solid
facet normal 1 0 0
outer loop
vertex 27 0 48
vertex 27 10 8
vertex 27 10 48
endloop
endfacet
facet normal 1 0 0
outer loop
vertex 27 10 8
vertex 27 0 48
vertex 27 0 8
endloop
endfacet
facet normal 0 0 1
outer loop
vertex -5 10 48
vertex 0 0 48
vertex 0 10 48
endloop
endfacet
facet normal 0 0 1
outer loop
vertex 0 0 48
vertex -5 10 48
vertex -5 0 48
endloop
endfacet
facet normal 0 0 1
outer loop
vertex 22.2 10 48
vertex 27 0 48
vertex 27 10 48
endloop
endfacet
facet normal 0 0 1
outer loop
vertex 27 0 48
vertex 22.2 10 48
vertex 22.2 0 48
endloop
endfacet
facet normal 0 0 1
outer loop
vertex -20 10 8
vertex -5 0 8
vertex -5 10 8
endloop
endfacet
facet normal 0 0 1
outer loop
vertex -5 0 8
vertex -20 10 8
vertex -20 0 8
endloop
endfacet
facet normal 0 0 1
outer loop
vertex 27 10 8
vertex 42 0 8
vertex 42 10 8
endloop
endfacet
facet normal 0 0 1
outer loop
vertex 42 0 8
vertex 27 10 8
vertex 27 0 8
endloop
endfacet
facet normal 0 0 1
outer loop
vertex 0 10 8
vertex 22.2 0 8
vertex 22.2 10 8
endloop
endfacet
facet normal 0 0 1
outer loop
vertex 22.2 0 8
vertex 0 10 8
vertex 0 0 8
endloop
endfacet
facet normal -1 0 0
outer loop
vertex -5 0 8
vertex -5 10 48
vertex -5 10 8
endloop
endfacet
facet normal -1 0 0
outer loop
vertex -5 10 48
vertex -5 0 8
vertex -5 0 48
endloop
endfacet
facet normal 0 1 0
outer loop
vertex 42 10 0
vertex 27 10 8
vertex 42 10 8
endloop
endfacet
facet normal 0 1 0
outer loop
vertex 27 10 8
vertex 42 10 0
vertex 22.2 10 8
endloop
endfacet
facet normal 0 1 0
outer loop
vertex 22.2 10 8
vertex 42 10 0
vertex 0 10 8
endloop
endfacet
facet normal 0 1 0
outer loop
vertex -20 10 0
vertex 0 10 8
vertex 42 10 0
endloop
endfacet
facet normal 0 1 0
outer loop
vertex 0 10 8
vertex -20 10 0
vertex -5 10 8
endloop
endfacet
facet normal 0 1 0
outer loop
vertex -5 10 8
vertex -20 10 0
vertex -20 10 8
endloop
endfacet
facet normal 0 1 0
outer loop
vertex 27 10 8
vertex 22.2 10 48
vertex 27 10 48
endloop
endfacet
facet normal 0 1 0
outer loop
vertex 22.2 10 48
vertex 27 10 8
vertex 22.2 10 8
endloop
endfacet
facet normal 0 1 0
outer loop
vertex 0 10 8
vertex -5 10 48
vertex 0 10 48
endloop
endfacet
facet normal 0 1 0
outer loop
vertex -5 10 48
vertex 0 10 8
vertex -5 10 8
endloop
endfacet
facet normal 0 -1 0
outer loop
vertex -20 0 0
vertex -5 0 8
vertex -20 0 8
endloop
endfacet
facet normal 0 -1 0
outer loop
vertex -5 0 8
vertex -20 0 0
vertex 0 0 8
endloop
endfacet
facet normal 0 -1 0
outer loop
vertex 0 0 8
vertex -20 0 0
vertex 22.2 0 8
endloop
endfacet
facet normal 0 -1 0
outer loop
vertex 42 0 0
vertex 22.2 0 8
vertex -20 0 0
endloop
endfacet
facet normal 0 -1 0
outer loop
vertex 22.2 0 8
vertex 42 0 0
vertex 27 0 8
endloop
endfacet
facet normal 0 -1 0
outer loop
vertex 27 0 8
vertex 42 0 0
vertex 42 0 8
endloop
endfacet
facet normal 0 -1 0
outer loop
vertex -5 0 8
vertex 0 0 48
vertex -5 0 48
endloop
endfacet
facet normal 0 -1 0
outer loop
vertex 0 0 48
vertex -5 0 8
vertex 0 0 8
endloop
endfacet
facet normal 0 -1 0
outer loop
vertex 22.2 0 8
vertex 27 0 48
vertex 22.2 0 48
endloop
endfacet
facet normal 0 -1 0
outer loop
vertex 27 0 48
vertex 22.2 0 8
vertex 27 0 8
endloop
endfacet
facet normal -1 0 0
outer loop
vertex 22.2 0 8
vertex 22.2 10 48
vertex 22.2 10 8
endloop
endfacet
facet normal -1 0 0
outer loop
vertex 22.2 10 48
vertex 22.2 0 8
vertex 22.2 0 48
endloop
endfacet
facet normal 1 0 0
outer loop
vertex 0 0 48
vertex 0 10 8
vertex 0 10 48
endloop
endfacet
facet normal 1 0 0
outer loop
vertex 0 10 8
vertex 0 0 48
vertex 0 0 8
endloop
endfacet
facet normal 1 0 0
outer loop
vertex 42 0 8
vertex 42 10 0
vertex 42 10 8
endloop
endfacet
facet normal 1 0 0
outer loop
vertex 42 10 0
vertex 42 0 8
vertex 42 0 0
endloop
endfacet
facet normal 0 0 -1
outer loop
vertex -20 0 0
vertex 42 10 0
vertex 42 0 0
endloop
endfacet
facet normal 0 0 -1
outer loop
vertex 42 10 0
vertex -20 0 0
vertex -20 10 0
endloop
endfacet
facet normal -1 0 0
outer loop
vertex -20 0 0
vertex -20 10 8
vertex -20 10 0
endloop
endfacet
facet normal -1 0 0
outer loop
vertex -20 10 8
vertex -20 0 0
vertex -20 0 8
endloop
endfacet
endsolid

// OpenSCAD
lightThickness = 22;
lightDepth = 10;
lightHeight = 40;
lightAllowance = 0.2;

lightHolderWallThickness = 5;
elevationHeight = 8;
totalHeight = elevationHeight + lightHeight;
footProtrusion = 15;

footWidth = lightThickness + (footProtrusion * 2);

holderWidth = lightThickness + (lightHolderWallThickness * 2);

module holderBody() {
    translate([-lightHolderWallThickness, 0, 0]) {
        cube([holderWidth, lightDepth, lightHeight]);
    }
    
}

module lightSocket() {
    cube([lightThickness + lightAllowance, lightDepth, lightHeight]);
}

module holder() {
    translate([0, 0, elevationHeight]) {
        difference() {
            holderBody();
            lightSocket();
        }
    }
   
}

module base() {
    baseXOffset = -(footProtrusion + lightHolderWallThickness);
    translate([baseXOffset, 0, 0]) {
        cube([holderWidth + footProtrusion * 2, lightDepth, elevationHeight]);
    }
    
}

module stand() {
    union() {
        holder();
        base();
    }
}

stand();
